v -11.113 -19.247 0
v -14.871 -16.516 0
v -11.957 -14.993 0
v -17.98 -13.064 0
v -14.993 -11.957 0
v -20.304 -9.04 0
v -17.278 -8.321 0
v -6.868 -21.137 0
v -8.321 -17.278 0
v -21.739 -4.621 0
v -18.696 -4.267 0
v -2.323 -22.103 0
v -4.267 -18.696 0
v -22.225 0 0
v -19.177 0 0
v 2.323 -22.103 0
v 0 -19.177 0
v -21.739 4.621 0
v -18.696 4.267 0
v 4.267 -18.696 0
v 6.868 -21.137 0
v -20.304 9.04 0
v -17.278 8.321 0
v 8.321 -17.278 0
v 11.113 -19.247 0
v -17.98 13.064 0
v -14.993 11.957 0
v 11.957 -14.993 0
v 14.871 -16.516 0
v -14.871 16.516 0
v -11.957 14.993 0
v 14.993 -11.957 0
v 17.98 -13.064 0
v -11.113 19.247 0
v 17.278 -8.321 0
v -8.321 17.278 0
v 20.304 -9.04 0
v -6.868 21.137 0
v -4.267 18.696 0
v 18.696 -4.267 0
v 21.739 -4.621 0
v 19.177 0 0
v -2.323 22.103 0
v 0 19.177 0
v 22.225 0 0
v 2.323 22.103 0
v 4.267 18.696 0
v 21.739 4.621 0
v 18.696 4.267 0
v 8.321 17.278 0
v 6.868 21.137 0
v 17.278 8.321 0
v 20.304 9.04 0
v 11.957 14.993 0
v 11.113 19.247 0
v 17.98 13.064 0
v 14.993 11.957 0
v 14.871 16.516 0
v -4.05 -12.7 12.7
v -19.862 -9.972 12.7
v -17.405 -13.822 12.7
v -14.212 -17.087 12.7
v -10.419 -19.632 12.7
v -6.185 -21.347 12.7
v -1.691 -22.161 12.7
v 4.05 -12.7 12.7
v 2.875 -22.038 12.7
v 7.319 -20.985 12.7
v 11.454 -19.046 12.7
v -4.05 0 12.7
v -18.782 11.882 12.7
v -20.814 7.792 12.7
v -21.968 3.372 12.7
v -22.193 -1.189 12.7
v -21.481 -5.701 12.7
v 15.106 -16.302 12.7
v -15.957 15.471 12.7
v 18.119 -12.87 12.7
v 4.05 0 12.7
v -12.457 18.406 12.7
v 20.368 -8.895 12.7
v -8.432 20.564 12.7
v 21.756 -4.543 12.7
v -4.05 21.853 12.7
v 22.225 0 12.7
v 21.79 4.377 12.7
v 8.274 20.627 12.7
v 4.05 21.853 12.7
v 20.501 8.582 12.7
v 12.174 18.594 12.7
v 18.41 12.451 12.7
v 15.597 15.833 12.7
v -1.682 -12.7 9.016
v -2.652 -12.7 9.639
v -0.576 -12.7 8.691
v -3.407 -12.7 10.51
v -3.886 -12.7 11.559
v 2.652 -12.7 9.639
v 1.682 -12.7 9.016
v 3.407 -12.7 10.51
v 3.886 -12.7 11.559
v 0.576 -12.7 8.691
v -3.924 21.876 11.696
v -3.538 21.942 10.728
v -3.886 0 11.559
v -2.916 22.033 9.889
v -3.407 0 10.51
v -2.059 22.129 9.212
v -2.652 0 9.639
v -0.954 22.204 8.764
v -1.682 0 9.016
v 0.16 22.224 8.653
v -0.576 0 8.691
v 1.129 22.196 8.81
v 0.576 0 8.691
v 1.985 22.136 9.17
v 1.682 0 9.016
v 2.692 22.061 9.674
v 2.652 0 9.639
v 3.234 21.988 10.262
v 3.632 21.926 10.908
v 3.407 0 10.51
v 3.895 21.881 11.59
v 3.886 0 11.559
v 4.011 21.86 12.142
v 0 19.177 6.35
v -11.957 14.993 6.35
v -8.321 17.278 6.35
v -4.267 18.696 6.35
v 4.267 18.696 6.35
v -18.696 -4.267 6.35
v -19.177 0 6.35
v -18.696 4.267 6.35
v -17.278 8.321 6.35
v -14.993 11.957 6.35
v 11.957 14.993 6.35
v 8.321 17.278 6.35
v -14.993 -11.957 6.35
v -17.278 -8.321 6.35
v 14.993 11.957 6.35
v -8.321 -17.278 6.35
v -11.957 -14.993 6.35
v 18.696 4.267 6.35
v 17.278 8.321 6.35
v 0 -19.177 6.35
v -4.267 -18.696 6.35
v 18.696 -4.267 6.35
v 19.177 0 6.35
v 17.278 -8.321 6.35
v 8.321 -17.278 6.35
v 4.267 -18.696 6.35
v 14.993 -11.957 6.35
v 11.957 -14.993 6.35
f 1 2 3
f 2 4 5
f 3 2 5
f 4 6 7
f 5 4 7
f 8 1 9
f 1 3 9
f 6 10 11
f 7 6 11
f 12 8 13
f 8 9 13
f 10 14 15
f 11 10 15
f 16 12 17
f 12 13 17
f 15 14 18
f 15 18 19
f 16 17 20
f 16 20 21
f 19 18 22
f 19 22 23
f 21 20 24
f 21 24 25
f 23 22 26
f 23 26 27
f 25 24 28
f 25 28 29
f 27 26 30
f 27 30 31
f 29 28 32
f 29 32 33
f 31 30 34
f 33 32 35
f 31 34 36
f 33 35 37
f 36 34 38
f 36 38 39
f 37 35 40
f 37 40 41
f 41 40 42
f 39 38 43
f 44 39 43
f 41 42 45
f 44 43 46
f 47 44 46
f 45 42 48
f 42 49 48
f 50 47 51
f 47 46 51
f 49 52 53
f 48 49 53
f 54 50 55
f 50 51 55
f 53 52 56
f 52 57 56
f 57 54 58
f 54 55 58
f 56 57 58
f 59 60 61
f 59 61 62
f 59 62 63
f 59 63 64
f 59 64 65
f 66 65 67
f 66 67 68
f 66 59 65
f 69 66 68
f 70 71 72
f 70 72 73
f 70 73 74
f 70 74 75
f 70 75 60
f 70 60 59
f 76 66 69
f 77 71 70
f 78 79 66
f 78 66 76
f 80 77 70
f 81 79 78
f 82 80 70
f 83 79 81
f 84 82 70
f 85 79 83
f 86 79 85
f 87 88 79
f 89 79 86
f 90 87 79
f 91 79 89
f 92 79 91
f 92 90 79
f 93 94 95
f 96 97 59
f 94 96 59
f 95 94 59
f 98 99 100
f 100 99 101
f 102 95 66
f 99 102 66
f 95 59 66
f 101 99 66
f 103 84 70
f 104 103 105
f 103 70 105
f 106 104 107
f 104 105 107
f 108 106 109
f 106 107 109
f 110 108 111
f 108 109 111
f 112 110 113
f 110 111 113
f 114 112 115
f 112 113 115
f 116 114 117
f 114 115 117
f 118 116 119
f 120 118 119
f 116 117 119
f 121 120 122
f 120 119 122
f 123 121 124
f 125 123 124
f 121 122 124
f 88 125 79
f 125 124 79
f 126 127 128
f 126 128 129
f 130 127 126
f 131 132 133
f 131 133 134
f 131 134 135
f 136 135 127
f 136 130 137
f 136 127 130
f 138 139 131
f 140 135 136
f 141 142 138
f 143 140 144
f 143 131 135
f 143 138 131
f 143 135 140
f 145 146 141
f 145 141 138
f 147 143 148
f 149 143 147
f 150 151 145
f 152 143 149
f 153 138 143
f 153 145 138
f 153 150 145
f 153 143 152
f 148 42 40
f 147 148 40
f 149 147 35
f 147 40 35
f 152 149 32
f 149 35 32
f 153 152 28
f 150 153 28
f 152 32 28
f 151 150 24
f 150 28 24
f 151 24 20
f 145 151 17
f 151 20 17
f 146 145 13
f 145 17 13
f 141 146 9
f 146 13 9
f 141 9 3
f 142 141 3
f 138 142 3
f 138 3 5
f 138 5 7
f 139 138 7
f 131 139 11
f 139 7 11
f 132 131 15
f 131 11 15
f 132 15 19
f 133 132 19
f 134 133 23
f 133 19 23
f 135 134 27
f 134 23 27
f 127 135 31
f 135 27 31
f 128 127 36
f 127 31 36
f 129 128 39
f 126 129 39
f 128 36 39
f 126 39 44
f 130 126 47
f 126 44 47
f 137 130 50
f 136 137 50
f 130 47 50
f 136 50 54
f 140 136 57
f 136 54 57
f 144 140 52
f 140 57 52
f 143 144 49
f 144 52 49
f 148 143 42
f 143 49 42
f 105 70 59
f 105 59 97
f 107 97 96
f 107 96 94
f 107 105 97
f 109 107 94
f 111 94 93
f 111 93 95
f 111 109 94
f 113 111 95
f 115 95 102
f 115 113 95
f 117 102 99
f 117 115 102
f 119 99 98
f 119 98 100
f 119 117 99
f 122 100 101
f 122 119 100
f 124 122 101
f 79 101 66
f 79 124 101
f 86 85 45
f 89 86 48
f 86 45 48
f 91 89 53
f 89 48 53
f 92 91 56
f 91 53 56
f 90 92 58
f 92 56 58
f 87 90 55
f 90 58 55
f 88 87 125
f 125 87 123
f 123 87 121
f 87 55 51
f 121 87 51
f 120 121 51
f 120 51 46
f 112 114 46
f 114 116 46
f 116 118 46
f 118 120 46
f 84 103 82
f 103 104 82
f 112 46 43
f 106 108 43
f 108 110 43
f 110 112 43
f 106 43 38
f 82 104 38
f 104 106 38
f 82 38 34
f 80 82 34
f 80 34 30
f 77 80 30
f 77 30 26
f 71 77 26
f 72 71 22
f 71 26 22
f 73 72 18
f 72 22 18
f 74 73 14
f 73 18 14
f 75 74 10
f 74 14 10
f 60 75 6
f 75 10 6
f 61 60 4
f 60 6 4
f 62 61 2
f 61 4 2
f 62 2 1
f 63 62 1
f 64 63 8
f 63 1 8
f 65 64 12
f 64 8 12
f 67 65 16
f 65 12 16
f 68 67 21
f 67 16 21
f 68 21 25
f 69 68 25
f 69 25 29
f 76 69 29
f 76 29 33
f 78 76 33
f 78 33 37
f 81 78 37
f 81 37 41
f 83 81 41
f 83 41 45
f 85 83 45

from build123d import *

# Parameters (mm, degrees)
F0_R     = 22.225
F1_DEPTH = 12.7
F2_R     = 19.177
F3_DEPTH = 6.35
F4_R     = 4.05
F5_DEPTH = 22.226
F6_DEPTH = 12.7


with BuildPart() as f1:
    # F0 (on Top) → F1 (new body)
    with BuildSketch(Plane.XY):
        Circle(F0_R)
    extrude(amount=F1_DEPTH)

    # F2 (on face) → F3 (cut)
    with BuildSketch(Plane(origin=(0, 0, 0), x_dir=(1, 0, 0), z_dir=(0, 0, -1))):
        Circle(F2_R)
    extrude(amount=-F3_DEPTH, mode=Mode.SUBTRACT)

    # F4 (on Front) → F5 (cut, through all)
    with BuildSketch(Plane.XZ):
        with Locations((0, 12.7)):
            Circle(F4_R)
    extrude(amount=-F5_DEPTH, mode=Mode.SUBTRACT)

    # F4 (on Front) → F6 (cut)
    with BuildSketch(Plane.XZ):
        with Locations((0, 12.7)):
            Circle(F4_R)
    extrude(amount=F6_DEPTH, mode=Mode.SUBTRACT)


solid = f1.part
